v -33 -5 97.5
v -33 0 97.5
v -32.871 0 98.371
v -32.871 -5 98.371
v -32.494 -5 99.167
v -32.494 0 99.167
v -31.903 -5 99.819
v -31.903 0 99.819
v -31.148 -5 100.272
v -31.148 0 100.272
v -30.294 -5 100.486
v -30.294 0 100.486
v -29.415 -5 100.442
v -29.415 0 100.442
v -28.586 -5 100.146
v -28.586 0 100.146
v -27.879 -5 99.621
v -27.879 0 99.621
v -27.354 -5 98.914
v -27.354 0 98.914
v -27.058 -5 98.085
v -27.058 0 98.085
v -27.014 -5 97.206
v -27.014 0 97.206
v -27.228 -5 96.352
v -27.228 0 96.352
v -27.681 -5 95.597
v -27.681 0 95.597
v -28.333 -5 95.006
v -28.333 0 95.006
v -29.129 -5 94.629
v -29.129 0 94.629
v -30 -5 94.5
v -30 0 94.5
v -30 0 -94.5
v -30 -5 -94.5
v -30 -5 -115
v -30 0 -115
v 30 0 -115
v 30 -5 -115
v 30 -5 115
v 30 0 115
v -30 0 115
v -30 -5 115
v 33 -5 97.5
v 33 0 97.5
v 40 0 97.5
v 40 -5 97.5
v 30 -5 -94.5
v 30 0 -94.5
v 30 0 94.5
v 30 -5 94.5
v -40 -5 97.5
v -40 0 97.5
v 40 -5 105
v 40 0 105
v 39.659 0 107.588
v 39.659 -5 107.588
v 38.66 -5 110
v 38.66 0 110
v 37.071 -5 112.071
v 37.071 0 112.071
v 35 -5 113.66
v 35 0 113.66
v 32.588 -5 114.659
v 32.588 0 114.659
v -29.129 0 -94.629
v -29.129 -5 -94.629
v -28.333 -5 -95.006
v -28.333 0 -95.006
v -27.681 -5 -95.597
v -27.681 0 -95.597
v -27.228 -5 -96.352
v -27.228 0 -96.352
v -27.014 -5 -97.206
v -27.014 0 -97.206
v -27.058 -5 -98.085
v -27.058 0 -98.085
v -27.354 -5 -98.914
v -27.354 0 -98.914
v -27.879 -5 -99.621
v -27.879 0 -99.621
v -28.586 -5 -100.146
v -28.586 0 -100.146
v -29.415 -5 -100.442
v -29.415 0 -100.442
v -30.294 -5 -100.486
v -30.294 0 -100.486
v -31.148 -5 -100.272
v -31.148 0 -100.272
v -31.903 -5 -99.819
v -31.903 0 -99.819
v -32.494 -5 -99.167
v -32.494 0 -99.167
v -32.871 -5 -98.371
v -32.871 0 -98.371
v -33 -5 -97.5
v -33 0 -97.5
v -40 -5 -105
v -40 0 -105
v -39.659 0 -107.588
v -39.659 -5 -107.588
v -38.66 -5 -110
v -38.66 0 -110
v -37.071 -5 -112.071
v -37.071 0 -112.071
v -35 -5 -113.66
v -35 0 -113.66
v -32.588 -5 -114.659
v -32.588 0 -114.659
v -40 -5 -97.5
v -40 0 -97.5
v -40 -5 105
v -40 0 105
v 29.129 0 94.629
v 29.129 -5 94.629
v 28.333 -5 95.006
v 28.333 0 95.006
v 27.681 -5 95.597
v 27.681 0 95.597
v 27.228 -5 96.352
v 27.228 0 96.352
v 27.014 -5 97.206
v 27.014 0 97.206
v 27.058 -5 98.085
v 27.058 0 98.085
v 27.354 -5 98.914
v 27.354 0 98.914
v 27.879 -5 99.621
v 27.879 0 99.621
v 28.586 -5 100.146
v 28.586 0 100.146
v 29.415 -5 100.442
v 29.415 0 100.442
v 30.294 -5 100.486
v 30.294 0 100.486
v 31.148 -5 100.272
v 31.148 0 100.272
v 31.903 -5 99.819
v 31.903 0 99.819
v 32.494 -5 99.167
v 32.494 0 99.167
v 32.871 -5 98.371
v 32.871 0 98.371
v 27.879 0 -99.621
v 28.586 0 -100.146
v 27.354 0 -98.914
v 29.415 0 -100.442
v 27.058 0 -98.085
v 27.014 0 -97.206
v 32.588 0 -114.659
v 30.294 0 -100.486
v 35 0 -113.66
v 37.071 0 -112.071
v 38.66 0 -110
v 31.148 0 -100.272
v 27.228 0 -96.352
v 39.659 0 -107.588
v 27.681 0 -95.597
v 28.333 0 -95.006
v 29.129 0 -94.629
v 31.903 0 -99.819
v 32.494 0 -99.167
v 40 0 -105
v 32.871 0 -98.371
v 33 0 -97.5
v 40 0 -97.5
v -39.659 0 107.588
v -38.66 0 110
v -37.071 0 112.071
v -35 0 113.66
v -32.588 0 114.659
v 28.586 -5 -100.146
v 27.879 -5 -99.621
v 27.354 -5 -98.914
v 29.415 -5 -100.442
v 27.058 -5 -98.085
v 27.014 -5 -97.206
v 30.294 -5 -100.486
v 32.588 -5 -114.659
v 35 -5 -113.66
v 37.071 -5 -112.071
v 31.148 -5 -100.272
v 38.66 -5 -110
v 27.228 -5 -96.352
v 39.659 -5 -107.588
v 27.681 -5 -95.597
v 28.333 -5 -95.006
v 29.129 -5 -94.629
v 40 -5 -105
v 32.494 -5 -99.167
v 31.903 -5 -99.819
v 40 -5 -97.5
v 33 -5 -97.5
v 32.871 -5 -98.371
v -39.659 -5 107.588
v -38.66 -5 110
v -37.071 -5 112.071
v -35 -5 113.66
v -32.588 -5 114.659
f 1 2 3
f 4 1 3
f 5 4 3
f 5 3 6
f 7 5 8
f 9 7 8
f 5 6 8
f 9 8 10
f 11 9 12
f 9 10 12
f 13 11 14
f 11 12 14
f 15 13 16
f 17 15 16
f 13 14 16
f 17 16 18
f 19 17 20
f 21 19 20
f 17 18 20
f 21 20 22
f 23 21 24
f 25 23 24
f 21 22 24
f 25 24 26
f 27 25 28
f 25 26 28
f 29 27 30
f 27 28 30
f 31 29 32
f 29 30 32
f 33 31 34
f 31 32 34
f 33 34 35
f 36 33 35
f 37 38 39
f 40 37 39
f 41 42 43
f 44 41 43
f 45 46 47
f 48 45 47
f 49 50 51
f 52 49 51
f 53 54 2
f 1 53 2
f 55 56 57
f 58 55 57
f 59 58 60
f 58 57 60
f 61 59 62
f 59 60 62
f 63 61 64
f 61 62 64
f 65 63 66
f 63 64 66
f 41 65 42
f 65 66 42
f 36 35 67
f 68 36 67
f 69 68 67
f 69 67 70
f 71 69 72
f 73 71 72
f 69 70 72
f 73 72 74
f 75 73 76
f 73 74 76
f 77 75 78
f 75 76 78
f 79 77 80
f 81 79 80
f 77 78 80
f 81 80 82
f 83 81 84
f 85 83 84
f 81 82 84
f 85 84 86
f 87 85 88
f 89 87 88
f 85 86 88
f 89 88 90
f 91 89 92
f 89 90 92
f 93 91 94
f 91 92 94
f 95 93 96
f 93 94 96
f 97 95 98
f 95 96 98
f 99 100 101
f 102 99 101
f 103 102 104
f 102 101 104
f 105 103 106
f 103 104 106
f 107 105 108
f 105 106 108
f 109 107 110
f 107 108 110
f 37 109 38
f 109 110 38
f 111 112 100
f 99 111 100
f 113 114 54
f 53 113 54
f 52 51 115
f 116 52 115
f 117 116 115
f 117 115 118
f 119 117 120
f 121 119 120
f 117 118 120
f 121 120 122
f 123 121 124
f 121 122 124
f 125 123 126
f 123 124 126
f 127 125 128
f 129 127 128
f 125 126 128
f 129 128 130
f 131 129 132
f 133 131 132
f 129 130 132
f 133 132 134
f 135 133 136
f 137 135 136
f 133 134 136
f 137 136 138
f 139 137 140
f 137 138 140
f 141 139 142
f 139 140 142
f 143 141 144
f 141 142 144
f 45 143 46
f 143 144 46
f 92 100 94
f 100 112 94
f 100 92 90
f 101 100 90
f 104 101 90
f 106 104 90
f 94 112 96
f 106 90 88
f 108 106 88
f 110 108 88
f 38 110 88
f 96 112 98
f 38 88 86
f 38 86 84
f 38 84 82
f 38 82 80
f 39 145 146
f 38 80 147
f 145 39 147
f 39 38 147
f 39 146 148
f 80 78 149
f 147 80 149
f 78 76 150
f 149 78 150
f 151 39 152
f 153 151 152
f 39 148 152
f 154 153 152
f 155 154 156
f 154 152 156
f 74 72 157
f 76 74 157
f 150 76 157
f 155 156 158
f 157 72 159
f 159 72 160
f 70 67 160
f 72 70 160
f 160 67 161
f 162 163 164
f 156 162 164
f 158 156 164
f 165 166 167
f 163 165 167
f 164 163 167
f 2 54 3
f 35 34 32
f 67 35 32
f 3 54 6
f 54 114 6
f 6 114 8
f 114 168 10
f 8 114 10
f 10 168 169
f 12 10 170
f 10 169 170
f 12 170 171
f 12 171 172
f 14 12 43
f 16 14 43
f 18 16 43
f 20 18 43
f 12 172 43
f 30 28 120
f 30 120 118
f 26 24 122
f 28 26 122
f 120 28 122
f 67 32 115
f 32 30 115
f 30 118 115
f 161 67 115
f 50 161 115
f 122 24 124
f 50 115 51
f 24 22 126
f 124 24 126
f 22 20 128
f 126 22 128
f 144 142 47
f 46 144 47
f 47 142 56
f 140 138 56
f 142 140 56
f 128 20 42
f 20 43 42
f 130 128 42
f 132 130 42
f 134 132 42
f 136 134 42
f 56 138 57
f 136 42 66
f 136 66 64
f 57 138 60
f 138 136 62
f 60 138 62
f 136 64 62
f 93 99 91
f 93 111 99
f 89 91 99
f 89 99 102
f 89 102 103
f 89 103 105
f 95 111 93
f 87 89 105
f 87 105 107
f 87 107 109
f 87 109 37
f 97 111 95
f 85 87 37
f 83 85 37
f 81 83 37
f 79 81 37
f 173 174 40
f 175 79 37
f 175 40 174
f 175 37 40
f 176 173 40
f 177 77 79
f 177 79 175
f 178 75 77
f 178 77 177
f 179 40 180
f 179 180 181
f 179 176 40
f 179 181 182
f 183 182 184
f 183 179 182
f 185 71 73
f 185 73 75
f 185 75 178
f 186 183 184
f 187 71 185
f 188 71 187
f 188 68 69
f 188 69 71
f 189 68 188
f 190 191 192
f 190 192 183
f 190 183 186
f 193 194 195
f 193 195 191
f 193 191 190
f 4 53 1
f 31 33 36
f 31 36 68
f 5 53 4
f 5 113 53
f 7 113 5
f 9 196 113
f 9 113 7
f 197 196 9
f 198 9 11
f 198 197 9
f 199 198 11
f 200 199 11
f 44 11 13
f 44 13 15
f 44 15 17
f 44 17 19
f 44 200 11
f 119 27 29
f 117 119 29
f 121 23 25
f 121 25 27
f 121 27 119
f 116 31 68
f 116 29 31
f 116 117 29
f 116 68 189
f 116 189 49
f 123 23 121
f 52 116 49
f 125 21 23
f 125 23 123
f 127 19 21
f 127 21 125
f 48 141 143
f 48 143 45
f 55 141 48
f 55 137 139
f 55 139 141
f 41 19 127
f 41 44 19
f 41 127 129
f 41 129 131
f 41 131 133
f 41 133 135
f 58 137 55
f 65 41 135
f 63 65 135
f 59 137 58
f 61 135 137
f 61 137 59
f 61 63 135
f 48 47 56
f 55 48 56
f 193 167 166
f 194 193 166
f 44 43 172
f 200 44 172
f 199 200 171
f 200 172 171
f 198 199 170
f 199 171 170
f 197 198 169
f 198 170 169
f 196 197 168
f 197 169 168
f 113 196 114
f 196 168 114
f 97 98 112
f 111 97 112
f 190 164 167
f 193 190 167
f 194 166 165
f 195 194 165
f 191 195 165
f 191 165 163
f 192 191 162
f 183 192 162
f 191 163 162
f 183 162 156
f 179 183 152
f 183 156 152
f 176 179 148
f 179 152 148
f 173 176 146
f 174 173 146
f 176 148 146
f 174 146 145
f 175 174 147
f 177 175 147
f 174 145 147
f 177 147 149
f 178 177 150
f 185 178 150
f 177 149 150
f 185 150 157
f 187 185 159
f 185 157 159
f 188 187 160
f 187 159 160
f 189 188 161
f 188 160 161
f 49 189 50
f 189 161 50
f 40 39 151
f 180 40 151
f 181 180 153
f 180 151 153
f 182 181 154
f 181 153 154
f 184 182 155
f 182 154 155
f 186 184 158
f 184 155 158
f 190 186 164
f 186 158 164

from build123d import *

# Parameters (mm, degrees)
F1_DEPTH = 5


with BuildPart() as f1:
    # F0 (on Front) → F1 (new body)
    with BuildSketch(Plane.XZ):
        with BuildLine():
            ThreePointArc((40, 105), (37.071068, 112.071068), (30, 115))
            Line((30, 115), (-30, 115))
            ThreePointArc((-30, 115), (-37.071068, 112.071068), (-40, 105))
            Line((-40, 105), (-40, 97.5))
            Line((-40, 97.5), (-33, 97.5))
            ThreePointArc((-33, 97.5), (-27.87868, 99.62132), (-30, 94.5))
            Line((-30, 94.5), (-30, -94.5))
            ThreePointArc((-30, -94.5), (-27.87868, -99.62132), (-33, -97.5))
            Line((-33, -97.5), (-40, -97.5))
            Line((-40, -97.5), (-40, -105))
            ThreePointArc((-40, -105), (-37.071068, -112.071068), (-30, -115))
            Line((-30, -115), (30, -115))
            ThreePointArc((30, -115), (37.071068, -112.071068), (40, -105))
            Line((40, -105), (40, -97.5))
            Line((40, -97.5), (33, -97.5))
            ThreePointArc((33, -97.5), (27.87868, -99.62132), (30, -94.5))
            Line((30, -94.5), (30, 94.5))
            ThreePointArc((30, 94.5), (27.87868, 99.62132), (33, 97.5))
            Line((33, 97.5), (40, 97.5))
            Line((40, 97.5), (40, 105))
        make_face()
    extrude(amount=F1_DEPTH)


solid = f1.part
